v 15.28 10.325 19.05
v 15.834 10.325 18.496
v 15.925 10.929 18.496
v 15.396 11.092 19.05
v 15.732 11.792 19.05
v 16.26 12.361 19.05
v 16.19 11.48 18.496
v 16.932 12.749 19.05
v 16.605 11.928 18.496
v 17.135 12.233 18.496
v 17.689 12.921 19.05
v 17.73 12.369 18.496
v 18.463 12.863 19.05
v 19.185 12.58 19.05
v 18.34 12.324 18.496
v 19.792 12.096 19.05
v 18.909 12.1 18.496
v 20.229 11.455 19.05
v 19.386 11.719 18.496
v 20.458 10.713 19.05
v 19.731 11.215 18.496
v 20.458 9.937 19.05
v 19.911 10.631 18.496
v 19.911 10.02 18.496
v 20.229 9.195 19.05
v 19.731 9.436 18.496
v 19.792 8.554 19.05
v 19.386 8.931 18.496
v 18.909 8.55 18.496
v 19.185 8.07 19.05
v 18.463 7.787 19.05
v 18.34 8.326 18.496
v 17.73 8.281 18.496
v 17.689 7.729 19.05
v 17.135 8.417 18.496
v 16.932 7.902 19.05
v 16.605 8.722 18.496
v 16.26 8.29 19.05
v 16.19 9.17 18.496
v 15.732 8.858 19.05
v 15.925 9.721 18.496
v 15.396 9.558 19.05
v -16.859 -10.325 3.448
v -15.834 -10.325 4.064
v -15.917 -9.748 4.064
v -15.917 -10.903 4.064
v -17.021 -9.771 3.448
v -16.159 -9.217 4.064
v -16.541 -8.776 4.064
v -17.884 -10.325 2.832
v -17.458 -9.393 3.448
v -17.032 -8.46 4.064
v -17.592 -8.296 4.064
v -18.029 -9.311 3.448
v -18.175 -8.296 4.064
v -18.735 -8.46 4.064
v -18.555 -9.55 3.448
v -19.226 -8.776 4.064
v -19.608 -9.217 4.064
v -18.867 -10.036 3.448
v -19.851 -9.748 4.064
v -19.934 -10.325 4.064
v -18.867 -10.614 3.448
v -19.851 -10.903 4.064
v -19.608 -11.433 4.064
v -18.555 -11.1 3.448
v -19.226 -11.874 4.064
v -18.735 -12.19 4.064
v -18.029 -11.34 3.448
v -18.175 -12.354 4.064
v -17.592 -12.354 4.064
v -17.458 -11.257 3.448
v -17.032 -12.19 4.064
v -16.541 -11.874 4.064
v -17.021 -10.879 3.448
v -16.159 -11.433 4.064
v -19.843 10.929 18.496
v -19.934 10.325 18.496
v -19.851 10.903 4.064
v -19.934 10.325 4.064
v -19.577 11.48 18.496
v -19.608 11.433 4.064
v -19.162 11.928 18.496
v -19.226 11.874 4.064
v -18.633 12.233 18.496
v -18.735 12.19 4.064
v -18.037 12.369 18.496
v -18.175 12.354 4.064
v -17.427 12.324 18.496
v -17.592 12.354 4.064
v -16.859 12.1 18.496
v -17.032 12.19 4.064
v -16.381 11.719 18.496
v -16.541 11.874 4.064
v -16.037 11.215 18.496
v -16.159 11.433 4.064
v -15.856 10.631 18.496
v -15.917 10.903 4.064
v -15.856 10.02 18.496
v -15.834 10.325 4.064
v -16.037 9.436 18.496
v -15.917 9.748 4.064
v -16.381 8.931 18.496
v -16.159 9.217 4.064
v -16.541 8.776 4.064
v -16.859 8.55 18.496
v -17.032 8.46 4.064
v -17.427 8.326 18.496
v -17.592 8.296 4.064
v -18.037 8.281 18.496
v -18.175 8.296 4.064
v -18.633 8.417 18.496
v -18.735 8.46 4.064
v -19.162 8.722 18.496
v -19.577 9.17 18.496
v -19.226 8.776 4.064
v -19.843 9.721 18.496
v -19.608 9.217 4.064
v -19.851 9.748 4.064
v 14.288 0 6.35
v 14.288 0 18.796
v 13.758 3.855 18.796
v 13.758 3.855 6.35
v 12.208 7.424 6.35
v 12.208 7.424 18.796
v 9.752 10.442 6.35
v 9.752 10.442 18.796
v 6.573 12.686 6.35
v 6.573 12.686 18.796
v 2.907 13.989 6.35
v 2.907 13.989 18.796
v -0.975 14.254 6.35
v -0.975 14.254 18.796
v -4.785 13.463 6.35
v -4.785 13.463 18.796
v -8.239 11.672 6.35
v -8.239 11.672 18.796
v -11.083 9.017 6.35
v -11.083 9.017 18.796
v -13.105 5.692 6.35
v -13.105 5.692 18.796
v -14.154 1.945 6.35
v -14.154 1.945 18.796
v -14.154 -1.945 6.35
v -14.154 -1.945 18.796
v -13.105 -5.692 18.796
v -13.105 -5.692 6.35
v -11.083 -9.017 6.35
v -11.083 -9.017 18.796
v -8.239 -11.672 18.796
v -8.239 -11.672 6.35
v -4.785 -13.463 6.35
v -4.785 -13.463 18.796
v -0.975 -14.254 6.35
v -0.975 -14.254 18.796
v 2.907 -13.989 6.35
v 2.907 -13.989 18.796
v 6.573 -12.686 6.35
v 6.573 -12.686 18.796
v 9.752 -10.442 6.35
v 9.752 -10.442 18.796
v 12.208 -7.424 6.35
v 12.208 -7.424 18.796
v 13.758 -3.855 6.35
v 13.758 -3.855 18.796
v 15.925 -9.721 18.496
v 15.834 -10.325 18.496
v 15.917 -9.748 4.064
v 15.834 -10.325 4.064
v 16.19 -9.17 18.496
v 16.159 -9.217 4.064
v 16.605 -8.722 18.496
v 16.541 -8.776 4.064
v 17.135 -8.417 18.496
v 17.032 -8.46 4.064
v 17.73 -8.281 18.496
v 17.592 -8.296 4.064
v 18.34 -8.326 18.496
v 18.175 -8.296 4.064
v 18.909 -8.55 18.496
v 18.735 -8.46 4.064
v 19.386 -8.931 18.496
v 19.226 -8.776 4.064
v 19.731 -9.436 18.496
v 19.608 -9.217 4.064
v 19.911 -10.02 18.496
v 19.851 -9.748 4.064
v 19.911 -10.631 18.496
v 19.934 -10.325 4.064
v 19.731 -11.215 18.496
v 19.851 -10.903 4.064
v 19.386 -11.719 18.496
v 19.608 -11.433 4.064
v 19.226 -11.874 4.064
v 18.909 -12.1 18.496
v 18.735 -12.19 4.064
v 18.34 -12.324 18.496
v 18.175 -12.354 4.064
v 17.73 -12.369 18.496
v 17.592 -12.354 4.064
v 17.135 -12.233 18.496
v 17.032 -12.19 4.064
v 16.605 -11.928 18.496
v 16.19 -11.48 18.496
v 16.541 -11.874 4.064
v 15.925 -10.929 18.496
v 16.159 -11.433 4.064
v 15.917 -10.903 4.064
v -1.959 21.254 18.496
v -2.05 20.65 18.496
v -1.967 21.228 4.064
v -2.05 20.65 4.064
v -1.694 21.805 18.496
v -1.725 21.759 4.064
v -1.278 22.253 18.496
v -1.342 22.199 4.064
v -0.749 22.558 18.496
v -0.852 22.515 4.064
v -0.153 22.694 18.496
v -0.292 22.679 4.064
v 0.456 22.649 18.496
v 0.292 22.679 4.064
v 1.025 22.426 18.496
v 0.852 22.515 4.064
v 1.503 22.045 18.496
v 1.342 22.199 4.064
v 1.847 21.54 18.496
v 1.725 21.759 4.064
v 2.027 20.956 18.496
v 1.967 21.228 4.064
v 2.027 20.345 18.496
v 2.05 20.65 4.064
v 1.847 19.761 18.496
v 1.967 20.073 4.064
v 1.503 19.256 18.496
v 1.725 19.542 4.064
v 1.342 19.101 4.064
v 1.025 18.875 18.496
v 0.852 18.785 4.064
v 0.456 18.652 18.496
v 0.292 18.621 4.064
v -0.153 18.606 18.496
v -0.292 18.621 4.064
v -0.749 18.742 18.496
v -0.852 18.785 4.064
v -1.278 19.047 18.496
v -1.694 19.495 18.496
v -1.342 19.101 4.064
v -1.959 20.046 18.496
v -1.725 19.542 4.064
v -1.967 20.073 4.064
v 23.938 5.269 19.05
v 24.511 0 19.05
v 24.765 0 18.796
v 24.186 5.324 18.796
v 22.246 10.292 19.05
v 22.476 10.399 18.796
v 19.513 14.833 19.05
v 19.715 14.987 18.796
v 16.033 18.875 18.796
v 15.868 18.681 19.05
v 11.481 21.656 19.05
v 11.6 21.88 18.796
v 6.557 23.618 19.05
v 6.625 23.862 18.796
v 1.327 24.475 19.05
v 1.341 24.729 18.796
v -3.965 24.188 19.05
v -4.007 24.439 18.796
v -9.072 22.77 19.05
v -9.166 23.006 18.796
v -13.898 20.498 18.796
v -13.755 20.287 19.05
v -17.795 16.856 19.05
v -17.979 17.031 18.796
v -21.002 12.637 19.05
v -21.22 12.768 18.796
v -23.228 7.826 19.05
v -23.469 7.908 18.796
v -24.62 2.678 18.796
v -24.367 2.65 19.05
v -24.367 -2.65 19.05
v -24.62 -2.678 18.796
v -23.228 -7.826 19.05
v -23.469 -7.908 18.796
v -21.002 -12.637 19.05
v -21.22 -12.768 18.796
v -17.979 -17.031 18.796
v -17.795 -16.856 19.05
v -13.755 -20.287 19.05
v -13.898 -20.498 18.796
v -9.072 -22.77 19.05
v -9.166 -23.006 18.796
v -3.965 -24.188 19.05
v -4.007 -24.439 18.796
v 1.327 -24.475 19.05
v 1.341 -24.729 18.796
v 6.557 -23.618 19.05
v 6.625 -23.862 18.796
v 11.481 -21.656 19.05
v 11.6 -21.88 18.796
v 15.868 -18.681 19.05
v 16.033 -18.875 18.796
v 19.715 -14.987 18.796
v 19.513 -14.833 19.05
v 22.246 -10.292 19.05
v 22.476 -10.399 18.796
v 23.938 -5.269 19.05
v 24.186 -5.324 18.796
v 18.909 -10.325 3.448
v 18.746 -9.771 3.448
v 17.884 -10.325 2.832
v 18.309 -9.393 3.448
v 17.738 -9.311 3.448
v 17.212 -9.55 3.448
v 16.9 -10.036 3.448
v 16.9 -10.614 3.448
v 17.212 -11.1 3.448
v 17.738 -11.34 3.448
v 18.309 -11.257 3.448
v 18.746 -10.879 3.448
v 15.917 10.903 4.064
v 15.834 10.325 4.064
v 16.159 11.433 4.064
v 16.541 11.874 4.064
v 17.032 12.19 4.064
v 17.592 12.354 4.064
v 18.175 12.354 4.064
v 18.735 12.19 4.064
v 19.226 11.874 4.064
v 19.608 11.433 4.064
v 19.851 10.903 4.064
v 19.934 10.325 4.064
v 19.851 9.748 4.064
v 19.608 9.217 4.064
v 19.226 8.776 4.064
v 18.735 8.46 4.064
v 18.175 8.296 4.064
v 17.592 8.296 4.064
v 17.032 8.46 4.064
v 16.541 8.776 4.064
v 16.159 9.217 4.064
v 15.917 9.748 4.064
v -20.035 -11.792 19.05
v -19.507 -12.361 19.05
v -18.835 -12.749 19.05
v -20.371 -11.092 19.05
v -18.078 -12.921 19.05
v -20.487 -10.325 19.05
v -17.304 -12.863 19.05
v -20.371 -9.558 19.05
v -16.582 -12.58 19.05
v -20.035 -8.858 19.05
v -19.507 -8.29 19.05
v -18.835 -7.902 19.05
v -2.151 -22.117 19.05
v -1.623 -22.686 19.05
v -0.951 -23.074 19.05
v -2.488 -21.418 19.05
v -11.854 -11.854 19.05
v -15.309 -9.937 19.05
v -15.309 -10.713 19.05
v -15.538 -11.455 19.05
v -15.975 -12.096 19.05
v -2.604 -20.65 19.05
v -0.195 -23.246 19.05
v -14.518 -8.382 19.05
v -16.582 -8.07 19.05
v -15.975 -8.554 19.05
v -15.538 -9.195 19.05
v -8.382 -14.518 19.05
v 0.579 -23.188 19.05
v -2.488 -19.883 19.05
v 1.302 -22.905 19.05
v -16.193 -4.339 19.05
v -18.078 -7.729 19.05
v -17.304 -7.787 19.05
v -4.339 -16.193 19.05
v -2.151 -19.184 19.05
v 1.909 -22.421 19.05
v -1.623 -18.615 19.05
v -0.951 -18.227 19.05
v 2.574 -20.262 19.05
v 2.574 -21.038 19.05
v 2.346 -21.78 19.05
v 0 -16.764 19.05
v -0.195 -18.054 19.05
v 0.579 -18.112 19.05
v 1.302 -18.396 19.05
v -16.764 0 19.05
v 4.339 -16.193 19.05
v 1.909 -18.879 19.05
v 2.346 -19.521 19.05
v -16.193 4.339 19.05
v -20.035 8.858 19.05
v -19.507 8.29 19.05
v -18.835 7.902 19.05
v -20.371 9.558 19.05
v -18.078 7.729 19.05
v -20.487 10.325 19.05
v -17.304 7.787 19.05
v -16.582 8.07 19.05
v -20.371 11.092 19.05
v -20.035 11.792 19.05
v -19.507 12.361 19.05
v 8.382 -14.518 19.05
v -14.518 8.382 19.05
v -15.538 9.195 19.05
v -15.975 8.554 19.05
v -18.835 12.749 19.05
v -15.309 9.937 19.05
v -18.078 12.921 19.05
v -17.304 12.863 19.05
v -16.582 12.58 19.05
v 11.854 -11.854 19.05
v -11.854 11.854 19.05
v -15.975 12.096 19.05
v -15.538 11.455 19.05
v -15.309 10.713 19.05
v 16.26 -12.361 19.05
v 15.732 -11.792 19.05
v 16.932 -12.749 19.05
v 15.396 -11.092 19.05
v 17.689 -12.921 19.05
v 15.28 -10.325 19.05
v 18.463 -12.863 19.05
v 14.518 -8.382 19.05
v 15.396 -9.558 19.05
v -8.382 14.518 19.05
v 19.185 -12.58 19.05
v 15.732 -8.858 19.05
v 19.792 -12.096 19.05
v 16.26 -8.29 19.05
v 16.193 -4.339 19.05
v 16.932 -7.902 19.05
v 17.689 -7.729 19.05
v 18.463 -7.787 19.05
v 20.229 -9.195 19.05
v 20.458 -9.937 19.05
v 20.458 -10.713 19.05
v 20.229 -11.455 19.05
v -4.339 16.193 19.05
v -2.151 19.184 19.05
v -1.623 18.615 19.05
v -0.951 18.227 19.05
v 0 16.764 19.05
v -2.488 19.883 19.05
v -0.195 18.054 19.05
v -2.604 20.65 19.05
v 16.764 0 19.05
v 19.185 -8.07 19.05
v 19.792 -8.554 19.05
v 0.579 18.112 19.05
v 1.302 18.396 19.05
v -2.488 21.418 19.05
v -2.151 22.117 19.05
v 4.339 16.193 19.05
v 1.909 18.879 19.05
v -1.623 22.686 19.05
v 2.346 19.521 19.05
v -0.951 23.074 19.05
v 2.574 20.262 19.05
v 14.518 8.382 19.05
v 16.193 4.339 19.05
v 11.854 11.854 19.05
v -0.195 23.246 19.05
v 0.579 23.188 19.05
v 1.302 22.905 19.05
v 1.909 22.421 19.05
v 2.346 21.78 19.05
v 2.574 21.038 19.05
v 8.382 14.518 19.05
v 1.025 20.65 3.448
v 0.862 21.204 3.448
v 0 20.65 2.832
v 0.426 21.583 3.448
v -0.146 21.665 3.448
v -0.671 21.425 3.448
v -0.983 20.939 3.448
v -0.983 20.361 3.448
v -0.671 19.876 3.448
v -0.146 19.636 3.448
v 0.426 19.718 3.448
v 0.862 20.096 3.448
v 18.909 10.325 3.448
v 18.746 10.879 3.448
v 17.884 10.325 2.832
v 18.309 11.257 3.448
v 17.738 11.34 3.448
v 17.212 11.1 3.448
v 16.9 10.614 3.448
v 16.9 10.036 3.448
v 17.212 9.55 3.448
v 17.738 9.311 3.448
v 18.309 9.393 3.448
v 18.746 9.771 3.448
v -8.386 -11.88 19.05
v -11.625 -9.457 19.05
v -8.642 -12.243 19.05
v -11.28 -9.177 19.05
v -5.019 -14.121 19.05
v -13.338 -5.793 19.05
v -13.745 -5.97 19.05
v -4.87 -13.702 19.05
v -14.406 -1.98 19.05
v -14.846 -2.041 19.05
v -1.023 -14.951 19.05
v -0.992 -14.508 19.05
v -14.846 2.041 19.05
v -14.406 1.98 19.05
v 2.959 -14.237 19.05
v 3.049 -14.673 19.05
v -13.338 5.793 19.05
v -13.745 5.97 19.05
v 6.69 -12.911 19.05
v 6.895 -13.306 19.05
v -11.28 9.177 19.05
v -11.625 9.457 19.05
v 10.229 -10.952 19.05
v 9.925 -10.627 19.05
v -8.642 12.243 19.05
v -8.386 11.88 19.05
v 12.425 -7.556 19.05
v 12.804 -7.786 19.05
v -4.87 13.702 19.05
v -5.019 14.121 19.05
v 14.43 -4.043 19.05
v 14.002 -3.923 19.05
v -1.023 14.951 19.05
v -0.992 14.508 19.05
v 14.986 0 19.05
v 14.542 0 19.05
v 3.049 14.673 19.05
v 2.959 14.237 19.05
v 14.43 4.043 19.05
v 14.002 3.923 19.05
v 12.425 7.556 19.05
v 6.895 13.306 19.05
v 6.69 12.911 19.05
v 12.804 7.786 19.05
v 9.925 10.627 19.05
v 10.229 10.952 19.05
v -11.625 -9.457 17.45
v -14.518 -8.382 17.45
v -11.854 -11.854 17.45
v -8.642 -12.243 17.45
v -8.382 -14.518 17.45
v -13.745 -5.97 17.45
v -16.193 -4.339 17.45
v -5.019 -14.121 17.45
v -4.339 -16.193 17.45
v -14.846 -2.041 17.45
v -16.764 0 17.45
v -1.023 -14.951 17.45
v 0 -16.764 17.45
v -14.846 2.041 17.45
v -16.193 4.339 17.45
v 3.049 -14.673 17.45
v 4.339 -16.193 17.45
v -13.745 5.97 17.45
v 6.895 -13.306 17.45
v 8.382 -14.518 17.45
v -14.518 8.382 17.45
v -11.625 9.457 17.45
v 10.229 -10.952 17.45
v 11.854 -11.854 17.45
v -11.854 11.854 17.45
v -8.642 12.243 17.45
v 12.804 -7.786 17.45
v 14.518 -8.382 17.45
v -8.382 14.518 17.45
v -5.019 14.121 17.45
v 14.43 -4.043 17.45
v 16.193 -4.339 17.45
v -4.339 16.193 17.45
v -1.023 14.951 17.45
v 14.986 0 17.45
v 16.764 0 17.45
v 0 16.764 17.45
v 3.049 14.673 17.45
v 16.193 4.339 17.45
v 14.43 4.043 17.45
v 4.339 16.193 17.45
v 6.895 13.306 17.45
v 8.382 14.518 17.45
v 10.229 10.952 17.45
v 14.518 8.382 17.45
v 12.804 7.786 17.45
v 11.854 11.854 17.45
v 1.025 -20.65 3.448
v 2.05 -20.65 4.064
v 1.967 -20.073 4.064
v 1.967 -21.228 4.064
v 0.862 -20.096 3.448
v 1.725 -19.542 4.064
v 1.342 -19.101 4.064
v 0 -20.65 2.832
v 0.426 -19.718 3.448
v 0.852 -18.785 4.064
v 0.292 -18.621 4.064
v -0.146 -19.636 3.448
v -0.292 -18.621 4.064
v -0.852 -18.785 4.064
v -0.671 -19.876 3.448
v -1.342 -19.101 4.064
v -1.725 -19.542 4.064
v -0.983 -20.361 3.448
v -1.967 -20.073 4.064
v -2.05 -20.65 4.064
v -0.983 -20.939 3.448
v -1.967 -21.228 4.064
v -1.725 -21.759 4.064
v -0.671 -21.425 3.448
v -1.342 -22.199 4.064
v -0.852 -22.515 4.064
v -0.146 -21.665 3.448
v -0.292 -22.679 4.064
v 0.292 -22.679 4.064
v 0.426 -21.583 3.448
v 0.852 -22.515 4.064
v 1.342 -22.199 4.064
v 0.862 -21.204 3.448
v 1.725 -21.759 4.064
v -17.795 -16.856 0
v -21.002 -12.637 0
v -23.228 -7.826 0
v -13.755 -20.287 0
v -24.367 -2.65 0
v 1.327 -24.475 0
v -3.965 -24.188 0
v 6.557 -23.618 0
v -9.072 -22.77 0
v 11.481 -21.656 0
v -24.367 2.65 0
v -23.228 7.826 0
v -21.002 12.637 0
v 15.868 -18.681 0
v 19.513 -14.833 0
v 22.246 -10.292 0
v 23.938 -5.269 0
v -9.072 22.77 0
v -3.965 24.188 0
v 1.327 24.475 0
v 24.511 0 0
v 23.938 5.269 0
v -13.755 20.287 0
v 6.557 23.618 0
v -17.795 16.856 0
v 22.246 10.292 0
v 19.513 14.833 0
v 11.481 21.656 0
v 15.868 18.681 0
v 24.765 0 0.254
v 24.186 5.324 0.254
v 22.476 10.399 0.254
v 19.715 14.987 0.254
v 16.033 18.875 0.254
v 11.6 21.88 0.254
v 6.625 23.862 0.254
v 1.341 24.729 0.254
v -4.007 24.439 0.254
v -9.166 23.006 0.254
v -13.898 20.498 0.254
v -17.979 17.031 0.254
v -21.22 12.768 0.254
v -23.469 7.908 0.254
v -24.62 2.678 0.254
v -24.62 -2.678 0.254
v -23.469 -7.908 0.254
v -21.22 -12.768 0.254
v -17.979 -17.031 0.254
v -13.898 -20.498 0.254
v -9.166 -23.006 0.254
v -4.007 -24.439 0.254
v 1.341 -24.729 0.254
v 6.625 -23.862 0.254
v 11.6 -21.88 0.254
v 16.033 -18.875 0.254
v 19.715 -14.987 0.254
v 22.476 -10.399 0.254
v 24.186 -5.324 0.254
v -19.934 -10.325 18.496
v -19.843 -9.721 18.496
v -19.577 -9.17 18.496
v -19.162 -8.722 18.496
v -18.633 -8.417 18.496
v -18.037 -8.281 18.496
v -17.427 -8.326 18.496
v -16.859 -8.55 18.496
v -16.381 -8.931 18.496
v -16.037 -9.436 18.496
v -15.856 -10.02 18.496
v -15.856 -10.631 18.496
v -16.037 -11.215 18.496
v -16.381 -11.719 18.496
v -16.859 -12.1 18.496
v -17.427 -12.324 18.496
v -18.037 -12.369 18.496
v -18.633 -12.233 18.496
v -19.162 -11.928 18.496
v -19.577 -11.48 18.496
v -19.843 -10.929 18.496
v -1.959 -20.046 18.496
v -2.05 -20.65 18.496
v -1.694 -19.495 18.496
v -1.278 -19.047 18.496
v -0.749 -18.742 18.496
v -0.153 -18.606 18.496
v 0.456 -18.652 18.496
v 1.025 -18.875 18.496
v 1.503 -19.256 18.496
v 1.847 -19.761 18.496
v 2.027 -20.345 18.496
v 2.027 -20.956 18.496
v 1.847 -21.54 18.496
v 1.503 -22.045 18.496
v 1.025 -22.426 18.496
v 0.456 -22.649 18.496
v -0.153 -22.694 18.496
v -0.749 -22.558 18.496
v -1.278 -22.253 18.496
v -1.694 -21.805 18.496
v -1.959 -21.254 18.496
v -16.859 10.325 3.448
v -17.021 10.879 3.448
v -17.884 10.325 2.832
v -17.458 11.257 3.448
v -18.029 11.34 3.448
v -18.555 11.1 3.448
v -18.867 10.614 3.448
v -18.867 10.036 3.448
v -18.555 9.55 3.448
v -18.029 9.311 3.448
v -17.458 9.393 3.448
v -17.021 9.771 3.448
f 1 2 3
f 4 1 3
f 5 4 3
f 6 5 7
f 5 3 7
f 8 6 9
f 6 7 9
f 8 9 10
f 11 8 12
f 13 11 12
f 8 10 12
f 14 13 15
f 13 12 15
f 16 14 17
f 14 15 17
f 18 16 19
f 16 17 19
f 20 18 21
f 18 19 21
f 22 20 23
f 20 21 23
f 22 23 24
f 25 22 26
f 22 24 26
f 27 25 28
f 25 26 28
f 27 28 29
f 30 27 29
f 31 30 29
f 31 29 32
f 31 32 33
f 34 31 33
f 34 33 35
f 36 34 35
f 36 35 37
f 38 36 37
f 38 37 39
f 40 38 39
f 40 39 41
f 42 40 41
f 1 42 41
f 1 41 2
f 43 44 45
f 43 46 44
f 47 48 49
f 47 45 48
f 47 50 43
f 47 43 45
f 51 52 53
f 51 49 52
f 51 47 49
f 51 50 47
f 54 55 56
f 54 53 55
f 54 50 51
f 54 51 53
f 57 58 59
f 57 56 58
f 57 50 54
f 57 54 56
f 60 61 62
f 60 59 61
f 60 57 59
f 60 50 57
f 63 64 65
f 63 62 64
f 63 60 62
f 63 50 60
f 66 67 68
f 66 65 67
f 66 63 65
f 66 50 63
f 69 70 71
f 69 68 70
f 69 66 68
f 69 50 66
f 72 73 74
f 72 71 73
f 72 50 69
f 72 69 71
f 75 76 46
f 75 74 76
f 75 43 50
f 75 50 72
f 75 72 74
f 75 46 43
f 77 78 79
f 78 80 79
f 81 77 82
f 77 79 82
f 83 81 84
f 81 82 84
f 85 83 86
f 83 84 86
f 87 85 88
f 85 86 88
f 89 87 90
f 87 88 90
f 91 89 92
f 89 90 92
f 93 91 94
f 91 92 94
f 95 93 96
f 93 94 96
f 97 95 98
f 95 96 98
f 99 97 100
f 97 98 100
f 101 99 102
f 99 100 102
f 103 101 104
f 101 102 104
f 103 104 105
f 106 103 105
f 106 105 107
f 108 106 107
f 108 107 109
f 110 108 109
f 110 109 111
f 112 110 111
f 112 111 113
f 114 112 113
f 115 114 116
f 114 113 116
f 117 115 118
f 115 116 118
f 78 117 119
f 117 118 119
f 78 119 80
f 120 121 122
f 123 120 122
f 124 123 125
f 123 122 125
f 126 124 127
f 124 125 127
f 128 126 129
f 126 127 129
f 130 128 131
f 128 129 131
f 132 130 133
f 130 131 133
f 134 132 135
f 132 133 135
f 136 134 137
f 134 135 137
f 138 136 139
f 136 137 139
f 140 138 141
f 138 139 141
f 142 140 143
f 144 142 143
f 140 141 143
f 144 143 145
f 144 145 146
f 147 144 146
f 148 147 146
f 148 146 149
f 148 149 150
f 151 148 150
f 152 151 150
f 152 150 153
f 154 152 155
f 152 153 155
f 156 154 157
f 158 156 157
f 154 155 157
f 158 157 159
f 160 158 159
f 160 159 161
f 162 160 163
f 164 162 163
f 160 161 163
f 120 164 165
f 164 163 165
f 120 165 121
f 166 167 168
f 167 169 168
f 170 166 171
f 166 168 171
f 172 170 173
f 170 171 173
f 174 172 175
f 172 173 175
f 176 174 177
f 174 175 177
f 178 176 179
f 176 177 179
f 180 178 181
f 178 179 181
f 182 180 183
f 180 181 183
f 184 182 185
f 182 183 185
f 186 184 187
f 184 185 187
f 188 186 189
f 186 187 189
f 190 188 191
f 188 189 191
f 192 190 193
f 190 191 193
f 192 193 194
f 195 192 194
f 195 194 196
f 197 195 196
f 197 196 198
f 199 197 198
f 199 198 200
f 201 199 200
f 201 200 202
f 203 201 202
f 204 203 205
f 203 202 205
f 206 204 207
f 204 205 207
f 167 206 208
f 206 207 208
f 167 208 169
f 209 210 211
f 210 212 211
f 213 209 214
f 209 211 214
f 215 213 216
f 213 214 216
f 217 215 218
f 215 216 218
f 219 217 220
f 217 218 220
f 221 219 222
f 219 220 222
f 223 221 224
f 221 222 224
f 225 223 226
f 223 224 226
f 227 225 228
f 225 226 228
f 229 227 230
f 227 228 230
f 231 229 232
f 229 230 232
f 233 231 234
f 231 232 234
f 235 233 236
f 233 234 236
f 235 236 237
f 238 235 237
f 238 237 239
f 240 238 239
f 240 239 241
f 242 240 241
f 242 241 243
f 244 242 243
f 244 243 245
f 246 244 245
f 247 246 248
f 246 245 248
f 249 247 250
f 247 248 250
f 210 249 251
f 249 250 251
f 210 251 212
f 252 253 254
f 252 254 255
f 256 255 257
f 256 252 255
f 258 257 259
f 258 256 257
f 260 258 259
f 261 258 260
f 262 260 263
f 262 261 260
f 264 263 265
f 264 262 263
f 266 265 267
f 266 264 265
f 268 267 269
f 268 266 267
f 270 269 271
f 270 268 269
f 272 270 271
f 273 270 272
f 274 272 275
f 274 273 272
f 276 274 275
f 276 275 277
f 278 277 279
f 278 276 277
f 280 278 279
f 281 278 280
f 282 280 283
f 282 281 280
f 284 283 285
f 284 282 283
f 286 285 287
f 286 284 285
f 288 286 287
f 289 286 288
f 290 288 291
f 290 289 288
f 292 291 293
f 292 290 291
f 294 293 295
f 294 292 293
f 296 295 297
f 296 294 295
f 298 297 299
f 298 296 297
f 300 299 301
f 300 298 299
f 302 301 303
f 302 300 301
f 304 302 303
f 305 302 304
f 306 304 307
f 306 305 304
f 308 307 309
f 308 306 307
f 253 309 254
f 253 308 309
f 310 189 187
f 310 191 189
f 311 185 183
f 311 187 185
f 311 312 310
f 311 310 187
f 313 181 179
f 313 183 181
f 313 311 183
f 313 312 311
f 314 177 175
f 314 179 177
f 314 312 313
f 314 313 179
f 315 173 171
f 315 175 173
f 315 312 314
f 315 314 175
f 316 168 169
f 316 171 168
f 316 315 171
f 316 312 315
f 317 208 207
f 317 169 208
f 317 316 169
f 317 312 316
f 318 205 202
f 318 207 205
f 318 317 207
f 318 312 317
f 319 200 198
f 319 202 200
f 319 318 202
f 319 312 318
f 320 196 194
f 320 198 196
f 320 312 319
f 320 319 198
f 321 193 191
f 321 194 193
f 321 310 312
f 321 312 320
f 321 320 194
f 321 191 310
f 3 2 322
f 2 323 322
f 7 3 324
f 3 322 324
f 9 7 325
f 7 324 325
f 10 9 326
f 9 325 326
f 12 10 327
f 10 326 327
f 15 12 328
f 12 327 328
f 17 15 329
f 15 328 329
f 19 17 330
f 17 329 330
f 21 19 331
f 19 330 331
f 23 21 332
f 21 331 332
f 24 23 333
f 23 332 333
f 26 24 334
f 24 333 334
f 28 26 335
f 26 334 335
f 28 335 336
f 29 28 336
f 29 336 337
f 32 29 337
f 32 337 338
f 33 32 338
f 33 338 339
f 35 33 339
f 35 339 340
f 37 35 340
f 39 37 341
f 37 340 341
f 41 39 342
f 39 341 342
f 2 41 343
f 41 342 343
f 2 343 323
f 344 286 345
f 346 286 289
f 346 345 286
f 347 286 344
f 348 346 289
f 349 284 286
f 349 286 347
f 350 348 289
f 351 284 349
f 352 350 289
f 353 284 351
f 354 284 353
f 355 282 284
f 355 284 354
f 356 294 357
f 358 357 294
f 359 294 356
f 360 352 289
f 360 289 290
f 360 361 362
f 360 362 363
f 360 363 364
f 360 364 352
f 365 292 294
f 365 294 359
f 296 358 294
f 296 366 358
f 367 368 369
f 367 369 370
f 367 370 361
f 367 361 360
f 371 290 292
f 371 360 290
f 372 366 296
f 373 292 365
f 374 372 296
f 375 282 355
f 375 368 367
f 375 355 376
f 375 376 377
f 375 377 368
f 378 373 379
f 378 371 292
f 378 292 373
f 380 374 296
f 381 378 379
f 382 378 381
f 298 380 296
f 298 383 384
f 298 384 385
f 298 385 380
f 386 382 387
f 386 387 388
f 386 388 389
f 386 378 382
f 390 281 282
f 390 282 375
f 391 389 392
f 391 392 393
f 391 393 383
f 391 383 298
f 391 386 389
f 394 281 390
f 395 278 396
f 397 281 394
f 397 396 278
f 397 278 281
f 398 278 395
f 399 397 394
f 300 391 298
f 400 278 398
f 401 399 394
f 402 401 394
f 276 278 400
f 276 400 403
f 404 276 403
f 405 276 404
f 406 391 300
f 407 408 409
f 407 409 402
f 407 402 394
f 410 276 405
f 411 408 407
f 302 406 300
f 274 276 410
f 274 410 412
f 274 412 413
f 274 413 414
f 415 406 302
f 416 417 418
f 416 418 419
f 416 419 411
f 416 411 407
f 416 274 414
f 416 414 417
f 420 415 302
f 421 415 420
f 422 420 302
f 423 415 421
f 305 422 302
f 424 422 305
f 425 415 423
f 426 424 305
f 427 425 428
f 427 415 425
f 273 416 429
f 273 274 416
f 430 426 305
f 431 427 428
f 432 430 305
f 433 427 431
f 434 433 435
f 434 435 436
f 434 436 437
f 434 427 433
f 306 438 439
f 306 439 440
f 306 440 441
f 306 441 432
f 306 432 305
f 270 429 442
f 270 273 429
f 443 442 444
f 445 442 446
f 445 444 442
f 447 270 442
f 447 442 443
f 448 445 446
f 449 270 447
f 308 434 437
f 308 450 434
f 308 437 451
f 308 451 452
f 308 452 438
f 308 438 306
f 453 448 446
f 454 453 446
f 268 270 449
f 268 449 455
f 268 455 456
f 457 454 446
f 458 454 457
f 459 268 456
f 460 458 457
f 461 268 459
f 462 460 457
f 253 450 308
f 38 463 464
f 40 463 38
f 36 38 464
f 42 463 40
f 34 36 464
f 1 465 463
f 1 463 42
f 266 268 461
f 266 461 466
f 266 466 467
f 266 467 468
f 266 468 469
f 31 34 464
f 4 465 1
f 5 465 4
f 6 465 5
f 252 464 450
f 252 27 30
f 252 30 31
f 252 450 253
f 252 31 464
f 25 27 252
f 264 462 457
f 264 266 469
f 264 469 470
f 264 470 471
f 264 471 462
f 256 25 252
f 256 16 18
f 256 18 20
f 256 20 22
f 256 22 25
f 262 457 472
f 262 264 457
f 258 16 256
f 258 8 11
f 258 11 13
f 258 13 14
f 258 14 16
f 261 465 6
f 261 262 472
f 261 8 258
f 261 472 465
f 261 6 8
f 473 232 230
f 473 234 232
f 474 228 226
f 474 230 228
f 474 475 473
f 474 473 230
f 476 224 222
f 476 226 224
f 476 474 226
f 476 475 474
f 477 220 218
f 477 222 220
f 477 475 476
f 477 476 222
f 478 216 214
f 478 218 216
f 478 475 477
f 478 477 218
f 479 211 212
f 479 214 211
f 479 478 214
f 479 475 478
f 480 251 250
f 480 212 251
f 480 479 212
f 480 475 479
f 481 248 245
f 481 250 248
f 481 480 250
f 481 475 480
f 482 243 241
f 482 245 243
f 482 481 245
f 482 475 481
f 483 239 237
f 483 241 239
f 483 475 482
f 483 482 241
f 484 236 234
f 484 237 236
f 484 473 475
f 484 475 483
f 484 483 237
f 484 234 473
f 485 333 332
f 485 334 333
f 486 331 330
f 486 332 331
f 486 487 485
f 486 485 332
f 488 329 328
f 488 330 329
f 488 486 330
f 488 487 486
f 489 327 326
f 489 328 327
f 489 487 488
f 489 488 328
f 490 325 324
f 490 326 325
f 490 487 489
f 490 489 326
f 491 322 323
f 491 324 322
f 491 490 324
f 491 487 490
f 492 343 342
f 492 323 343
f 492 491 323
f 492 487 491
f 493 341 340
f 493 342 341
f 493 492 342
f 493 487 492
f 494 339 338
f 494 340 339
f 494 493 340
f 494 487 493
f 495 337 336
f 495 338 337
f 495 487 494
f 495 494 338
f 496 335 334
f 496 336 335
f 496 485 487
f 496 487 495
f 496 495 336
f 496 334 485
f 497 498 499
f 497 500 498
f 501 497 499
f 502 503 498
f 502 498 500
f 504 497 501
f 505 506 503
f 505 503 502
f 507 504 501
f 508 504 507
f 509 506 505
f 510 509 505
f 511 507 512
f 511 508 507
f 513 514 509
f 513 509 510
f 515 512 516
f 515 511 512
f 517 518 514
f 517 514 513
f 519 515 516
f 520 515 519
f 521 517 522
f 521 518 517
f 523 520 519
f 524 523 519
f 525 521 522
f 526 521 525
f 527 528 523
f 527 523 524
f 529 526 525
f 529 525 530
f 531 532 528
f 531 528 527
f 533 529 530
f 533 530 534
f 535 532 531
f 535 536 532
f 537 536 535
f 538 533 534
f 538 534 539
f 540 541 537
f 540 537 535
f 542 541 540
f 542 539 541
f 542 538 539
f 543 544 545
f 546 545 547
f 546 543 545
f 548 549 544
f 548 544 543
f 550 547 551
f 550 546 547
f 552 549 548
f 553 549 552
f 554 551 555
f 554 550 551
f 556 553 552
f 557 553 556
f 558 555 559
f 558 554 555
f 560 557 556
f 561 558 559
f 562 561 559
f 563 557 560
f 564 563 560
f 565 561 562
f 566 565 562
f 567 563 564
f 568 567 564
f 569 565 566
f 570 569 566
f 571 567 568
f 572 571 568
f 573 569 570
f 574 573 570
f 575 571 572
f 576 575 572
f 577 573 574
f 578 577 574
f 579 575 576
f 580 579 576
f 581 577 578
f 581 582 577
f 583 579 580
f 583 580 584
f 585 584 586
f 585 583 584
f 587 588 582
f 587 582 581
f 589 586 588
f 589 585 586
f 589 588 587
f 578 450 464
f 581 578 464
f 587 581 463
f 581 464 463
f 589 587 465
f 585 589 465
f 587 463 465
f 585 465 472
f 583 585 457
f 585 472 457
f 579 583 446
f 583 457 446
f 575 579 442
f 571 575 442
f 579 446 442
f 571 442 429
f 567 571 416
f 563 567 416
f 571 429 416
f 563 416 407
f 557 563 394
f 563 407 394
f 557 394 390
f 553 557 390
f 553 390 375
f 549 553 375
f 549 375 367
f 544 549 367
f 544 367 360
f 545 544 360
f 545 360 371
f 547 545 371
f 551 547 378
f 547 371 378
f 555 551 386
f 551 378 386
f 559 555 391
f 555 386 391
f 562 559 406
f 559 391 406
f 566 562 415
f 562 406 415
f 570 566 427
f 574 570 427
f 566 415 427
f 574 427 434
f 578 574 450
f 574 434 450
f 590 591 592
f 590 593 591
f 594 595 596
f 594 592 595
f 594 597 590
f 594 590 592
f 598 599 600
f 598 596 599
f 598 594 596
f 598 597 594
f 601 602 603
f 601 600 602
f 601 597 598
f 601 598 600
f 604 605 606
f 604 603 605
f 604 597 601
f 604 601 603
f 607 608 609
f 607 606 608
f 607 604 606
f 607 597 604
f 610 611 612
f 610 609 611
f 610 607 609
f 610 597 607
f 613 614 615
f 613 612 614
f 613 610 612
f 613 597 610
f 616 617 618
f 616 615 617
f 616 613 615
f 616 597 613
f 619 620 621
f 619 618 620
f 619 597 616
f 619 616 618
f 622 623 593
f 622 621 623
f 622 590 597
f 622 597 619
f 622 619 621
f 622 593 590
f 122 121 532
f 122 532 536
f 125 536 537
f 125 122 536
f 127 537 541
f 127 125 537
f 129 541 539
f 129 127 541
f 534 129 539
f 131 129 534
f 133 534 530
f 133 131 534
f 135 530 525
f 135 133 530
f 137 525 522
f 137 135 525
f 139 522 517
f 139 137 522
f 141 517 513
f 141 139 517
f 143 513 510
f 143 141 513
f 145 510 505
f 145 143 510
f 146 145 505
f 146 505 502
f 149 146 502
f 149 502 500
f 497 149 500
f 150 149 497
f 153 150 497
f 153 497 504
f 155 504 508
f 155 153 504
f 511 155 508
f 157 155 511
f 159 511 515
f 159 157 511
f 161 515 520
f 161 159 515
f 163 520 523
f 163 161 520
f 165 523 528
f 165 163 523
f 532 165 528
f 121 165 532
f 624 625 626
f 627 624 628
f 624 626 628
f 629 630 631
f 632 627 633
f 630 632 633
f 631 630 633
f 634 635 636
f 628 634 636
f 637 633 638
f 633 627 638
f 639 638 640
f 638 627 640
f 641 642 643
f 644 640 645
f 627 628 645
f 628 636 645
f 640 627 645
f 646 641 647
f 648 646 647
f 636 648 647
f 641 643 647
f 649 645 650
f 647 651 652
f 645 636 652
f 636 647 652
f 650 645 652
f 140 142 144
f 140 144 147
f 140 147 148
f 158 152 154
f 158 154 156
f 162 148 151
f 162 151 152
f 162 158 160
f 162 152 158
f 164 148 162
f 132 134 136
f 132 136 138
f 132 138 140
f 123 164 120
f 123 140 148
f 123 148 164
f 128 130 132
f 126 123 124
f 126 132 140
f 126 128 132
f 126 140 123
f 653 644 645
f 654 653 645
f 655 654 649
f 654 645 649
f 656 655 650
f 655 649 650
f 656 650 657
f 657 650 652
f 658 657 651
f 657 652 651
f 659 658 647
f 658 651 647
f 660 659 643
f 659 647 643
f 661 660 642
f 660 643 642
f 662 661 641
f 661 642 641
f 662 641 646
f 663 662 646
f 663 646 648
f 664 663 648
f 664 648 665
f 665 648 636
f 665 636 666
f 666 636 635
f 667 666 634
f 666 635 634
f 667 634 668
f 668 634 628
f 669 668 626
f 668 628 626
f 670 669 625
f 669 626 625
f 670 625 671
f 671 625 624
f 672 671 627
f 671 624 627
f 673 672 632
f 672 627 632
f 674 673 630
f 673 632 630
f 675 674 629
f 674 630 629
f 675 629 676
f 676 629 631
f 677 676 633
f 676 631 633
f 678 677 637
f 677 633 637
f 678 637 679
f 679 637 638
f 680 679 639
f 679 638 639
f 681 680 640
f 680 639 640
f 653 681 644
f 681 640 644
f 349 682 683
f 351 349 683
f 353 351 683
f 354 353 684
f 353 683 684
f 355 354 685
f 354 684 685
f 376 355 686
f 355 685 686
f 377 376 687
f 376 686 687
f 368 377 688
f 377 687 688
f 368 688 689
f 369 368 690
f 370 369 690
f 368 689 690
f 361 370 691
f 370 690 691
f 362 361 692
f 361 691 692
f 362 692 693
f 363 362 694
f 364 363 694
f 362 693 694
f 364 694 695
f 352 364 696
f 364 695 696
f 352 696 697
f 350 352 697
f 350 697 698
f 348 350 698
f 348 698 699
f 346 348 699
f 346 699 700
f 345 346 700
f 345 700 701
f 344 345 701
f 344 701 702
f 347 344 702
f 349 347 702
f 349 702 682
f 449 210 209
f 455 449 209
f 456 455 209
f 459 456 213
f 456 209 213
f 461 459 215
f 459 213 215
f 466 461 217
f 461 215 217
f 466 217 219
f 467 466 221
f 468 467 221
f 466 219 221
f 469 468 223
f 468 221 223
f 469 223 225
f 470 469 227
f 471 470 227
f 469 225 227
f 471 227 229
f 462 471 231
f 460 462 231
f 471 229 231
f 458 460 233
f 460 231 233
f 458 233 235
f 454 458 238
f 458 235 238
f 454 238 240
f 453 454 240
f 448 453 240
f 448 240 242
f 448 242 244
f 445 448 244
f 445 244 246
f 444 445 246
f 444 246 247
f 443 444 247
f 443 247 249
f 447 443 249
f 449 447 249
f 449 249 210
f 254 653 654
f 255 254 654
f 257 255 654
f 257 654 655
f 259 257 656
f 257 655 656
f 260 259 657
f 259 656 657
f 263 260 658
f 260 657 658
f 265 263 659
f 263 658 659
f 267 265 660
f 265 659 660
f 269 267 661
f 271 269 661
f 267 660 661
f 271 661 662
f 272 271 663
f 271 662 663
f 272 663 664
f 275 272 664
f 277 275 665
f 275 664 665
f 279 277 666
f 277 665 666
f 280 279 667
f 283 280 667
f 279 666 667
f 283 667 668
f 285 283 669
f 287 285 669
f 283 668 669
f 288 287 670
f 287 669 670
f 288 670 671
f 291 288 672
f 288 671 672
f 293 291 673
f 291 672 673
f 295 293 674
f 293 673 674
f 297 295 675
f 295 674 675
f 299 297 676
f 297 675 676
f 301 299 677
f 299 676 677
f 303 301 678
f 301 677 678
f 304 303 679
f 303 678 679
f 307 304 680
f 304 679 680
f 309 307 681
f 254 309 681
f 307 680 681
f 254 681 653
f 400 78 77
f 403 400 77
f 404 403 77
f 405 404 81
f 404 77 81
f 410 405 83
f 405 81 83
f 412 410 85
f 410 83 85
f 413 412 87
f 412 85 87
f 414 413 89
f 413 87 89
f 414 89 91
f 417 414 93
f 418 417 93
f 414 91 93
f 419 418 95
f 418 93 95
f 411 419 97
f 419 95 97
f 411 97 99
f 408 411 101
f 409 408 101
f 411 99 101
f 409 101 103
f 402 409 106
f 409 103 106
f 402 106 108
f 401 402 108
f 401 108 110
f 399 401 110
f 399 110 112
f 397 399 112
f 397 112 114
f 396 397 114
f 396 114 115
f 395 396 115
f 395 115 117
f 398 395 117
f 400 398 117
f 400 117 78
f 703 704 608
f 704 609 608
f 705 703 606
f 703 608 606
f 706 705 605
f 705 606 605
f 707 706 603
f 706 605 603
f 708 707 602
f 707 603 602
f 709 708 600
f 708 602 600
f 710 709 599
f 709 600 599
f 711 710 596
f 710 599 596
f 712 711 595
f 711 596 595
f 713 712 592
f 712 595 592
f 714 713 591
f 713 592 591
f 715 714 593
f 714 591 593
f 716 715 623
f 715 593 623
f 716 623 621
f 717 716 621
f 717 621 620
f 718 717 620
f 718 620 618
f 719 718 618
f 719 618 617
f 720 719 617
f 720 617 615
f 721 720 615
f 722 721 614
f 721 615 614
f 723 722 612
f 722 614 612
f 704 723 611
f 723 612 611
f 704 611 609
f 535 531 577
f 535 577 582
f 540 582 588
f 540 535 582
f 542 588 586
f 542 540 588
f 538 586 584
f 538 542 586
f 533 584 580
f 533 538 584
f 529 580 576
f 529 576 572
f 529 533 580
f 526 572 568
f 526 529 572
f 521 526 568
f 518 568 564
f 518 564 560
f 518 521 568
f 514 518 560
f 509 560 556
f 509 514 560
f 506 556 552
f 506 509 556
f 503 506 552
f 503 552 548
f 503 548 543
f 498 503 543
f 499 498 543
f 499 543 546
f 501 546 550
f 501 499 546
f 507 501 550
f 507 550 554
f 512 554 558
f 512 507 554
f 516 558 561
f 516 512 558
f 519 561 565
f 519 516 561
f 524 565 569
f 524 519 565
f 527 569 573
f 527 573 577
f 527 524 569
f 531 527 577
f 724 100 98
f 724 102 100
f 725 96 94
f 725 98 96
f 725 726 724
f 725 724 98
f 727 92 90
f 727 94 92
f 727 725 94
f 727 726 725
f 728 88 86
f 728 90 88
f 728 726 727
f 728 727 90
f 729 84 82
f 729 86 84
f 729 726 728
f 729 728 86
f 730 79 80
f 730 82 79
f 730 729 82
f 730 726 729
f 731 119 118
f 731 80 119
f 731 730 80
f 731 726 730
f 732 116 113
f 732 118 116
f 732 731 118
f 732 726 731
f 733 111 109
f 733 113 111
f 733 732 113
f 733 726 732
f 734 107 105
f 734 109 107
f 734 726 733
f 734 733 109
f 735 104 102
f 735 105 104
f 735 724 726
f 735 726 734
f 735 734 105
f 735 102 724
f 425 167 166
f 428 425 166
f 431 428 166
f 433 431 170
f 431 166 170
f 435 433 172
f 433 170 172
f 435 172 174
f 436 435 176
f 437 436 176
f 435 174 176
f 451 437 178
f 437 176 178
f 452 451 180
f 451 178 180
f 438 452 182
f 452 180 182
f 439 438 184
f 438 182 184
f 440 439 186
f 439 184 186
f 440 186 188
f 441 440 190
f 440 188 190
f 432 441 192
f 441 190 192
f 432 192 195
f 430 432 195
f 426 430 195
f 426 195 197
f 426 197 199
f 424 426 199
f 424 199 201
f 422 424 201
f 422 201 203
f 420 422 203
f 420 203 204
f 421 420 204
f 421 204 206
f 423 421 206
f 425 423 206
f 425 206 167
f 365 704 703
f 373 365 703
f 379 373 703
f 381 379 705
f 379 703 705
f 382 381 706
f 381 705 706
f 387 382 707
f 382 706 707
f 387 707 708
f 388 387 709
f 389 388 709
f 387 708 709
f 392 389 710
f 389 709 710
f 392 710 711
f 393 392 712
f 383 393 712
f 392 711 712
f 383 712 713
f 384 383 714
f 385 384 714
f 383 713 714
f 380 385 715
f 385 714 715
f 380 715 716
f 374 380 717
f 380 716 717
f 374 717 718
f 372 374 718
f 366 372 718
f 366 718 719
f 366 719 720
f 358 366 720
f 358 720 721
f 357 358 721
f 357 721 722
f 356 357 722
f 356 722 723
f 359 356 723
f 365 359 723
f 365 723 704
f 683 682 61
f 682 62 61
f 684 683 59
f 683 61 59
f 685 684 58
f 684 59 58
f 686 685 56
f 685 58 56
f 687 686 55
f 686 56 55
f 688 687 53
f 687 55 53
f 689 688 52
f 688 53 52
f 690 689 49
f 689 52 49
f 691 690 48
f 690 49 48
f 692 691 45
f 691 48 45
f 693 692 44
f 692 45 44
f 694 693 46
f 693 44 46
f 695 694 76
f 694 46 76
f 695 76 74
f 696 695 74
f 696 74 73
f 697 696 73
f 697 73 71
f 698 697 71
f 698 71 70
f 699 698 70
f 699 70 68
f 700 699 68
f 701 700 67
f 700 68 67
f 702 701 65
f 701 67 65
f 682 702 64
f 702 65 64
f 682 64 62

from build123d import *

# Parameters (mm, degrees)
CYLINDER_R       = 24.765
CYLINDER_DEPTH   = 19.05
HOLE_D           = 4.1
HOLE_DEPTH       = 14.986
HOLE_CSINK_D     = 5.207
HOLE_CSINK_ANGLE = 90
HOLE_TIPS_R      = 2.05
SKETCH001_R      = 14.2875
POCKET_DEPTH     = 12.7
SKETCH002_R      = 16.764
SKETCH002_R_2    = 14.986
POCKET001_DEPTH  = 1.6002
CHAMFER_SIZE     = 0.254


with BuildPart() as part:
    # Cylinder → Cylinder (join)
    with BuildSketch(Plane.XY):
        Circle(CYLINDER_R)
    extrude(amount=CYLINDER_DEPTH)

    # Hole
    with Locations(Plane.XY.offset(19.05)):
        with Locations((0, 20.6502), (17.883598, 10.3251), (17.883598, -10.3251), (0, -20.6502), (-17.883598, -10.3251), (-17.883598, 10.3251)):
            CounterSinkHole(HOLE_D / 2, HOLE_CSINK_D / 2, depth=HOLE_DEPTH, counter_sink_angle=HOLE_CSINK_ANGLE)

    # Hole tips → Hole tip 1 section 0
    with BuildSketch(Plane.XY.offset(4.064), mode=Mode.PRIVATE) as hole_tip_1_s0:
        with Locations((0, 20.6502)):
            Circle(HOLE_TIPS_R)
    loft([hole_tip_1_s0.sketch, Vertex(0, 20.6502, 2.832236)], mode=Mode.SUBTRACT)

    # Hole tips → Hole tip 2 section 0
    with BuildSketch(Plane.XY.offset(4.064), mode=Mode.PRIVATE) as hole_tip_2_s0:
        with Locations((17.883598, 10.3251)):
            Circle(HOLE_TIPS_R)
    loft([hole_tip_2_s0.sketch, Vertex(17.883598, 10.3251, 2.832236)], mode=Mode.SUBTRACT)

    # Hole tips → Hole tip 3 section 0
    with BuildSketch(Plane.XY.offset(4.064), mode=Mode.PRIVATE) as hole_tip_3_s0:
        with Locations((17.883598, -10.3251)):
            Circle(HOLE_TIPS_R)
    loft([hole_tip_3_s0.sketch, Vertex(17.883598, -10.3251, 2.832236)], mode=Mode.SUBTRACT)

    # Hole tips → Hole tip 4 section 0
    with BuildSketch(Plane.XY.offset(4.064), mode=Mode.PRIVATE) as hole_tip_4_s0:
        with Locations((0, -20.6502)):
            Circle(HOLE_TIPS_R)
    loft([hole_tip_4_s0.sketch, Vertex(0, -20.6502, 2.832236)], mode=Mode.SUBTRACT)

    # Hole tips → Hole tip 5 section 0
    with BuildSketch(Plane.XY.offset(4.064), mode=Mode.PRIVATE) as hole_tip_5_s0:
        with Locations((-17.883598, -10.3251)):
            Circle(HOLE_TIPS_R)
    loft([hole_tip_5_s0.sketch, Vertex(-17.883598, -10.3251, 2.832236)], mode=Mode.SUBTRACT)

    # Hole tips → Hole tip 6 section 0
    with BuildSketch(Plane.XY.offset(4.064), mode=Mode.PRIVATE) as hole_tip_6_s0:
        with Locations((-17.883598, 10.3251)):
            Circle(HOLE_TIPS_R)
    loft([hole_tip_6_s0.sketch, Vertex(-17.883598, 10.3251, 2.832236)], mode=Mode.SUBTRACT)

    # Sketch001 (on Face2 of Hole) → Pocket (cut)
    with BuildSketch(Plane.XY.offset(19.05)):
        Circle(SKETCH001_R)
    extrude(amount=-POCKET_DEPTH, mode=Mode.SUBTRACT)

    # Sketch002 (on Face2 of Pocket) → Pocket001 (cut)
    with BuildSketch(Plane.XY.offset(19.05)):
        Circle(SKETCH002_R)
        Circle(SKETCH002_R_2, mode=Mode.SUBTRACT)
    extrude(amount=-POCKET001_DEPTH, mode=Mode.SUBTRACT)

    # Chamfer
    chamfer_edges = [part.edges().sort_by_distance(p)[0] for p in [
        (-14.2875, 0, 19.05),
        (-24.765, 0, 19.05),
        (-24.765, 0, 0),
    ]]
    chamfer(chamfer_edges, length=CHAMFER_SIZE)


solid = part.part
